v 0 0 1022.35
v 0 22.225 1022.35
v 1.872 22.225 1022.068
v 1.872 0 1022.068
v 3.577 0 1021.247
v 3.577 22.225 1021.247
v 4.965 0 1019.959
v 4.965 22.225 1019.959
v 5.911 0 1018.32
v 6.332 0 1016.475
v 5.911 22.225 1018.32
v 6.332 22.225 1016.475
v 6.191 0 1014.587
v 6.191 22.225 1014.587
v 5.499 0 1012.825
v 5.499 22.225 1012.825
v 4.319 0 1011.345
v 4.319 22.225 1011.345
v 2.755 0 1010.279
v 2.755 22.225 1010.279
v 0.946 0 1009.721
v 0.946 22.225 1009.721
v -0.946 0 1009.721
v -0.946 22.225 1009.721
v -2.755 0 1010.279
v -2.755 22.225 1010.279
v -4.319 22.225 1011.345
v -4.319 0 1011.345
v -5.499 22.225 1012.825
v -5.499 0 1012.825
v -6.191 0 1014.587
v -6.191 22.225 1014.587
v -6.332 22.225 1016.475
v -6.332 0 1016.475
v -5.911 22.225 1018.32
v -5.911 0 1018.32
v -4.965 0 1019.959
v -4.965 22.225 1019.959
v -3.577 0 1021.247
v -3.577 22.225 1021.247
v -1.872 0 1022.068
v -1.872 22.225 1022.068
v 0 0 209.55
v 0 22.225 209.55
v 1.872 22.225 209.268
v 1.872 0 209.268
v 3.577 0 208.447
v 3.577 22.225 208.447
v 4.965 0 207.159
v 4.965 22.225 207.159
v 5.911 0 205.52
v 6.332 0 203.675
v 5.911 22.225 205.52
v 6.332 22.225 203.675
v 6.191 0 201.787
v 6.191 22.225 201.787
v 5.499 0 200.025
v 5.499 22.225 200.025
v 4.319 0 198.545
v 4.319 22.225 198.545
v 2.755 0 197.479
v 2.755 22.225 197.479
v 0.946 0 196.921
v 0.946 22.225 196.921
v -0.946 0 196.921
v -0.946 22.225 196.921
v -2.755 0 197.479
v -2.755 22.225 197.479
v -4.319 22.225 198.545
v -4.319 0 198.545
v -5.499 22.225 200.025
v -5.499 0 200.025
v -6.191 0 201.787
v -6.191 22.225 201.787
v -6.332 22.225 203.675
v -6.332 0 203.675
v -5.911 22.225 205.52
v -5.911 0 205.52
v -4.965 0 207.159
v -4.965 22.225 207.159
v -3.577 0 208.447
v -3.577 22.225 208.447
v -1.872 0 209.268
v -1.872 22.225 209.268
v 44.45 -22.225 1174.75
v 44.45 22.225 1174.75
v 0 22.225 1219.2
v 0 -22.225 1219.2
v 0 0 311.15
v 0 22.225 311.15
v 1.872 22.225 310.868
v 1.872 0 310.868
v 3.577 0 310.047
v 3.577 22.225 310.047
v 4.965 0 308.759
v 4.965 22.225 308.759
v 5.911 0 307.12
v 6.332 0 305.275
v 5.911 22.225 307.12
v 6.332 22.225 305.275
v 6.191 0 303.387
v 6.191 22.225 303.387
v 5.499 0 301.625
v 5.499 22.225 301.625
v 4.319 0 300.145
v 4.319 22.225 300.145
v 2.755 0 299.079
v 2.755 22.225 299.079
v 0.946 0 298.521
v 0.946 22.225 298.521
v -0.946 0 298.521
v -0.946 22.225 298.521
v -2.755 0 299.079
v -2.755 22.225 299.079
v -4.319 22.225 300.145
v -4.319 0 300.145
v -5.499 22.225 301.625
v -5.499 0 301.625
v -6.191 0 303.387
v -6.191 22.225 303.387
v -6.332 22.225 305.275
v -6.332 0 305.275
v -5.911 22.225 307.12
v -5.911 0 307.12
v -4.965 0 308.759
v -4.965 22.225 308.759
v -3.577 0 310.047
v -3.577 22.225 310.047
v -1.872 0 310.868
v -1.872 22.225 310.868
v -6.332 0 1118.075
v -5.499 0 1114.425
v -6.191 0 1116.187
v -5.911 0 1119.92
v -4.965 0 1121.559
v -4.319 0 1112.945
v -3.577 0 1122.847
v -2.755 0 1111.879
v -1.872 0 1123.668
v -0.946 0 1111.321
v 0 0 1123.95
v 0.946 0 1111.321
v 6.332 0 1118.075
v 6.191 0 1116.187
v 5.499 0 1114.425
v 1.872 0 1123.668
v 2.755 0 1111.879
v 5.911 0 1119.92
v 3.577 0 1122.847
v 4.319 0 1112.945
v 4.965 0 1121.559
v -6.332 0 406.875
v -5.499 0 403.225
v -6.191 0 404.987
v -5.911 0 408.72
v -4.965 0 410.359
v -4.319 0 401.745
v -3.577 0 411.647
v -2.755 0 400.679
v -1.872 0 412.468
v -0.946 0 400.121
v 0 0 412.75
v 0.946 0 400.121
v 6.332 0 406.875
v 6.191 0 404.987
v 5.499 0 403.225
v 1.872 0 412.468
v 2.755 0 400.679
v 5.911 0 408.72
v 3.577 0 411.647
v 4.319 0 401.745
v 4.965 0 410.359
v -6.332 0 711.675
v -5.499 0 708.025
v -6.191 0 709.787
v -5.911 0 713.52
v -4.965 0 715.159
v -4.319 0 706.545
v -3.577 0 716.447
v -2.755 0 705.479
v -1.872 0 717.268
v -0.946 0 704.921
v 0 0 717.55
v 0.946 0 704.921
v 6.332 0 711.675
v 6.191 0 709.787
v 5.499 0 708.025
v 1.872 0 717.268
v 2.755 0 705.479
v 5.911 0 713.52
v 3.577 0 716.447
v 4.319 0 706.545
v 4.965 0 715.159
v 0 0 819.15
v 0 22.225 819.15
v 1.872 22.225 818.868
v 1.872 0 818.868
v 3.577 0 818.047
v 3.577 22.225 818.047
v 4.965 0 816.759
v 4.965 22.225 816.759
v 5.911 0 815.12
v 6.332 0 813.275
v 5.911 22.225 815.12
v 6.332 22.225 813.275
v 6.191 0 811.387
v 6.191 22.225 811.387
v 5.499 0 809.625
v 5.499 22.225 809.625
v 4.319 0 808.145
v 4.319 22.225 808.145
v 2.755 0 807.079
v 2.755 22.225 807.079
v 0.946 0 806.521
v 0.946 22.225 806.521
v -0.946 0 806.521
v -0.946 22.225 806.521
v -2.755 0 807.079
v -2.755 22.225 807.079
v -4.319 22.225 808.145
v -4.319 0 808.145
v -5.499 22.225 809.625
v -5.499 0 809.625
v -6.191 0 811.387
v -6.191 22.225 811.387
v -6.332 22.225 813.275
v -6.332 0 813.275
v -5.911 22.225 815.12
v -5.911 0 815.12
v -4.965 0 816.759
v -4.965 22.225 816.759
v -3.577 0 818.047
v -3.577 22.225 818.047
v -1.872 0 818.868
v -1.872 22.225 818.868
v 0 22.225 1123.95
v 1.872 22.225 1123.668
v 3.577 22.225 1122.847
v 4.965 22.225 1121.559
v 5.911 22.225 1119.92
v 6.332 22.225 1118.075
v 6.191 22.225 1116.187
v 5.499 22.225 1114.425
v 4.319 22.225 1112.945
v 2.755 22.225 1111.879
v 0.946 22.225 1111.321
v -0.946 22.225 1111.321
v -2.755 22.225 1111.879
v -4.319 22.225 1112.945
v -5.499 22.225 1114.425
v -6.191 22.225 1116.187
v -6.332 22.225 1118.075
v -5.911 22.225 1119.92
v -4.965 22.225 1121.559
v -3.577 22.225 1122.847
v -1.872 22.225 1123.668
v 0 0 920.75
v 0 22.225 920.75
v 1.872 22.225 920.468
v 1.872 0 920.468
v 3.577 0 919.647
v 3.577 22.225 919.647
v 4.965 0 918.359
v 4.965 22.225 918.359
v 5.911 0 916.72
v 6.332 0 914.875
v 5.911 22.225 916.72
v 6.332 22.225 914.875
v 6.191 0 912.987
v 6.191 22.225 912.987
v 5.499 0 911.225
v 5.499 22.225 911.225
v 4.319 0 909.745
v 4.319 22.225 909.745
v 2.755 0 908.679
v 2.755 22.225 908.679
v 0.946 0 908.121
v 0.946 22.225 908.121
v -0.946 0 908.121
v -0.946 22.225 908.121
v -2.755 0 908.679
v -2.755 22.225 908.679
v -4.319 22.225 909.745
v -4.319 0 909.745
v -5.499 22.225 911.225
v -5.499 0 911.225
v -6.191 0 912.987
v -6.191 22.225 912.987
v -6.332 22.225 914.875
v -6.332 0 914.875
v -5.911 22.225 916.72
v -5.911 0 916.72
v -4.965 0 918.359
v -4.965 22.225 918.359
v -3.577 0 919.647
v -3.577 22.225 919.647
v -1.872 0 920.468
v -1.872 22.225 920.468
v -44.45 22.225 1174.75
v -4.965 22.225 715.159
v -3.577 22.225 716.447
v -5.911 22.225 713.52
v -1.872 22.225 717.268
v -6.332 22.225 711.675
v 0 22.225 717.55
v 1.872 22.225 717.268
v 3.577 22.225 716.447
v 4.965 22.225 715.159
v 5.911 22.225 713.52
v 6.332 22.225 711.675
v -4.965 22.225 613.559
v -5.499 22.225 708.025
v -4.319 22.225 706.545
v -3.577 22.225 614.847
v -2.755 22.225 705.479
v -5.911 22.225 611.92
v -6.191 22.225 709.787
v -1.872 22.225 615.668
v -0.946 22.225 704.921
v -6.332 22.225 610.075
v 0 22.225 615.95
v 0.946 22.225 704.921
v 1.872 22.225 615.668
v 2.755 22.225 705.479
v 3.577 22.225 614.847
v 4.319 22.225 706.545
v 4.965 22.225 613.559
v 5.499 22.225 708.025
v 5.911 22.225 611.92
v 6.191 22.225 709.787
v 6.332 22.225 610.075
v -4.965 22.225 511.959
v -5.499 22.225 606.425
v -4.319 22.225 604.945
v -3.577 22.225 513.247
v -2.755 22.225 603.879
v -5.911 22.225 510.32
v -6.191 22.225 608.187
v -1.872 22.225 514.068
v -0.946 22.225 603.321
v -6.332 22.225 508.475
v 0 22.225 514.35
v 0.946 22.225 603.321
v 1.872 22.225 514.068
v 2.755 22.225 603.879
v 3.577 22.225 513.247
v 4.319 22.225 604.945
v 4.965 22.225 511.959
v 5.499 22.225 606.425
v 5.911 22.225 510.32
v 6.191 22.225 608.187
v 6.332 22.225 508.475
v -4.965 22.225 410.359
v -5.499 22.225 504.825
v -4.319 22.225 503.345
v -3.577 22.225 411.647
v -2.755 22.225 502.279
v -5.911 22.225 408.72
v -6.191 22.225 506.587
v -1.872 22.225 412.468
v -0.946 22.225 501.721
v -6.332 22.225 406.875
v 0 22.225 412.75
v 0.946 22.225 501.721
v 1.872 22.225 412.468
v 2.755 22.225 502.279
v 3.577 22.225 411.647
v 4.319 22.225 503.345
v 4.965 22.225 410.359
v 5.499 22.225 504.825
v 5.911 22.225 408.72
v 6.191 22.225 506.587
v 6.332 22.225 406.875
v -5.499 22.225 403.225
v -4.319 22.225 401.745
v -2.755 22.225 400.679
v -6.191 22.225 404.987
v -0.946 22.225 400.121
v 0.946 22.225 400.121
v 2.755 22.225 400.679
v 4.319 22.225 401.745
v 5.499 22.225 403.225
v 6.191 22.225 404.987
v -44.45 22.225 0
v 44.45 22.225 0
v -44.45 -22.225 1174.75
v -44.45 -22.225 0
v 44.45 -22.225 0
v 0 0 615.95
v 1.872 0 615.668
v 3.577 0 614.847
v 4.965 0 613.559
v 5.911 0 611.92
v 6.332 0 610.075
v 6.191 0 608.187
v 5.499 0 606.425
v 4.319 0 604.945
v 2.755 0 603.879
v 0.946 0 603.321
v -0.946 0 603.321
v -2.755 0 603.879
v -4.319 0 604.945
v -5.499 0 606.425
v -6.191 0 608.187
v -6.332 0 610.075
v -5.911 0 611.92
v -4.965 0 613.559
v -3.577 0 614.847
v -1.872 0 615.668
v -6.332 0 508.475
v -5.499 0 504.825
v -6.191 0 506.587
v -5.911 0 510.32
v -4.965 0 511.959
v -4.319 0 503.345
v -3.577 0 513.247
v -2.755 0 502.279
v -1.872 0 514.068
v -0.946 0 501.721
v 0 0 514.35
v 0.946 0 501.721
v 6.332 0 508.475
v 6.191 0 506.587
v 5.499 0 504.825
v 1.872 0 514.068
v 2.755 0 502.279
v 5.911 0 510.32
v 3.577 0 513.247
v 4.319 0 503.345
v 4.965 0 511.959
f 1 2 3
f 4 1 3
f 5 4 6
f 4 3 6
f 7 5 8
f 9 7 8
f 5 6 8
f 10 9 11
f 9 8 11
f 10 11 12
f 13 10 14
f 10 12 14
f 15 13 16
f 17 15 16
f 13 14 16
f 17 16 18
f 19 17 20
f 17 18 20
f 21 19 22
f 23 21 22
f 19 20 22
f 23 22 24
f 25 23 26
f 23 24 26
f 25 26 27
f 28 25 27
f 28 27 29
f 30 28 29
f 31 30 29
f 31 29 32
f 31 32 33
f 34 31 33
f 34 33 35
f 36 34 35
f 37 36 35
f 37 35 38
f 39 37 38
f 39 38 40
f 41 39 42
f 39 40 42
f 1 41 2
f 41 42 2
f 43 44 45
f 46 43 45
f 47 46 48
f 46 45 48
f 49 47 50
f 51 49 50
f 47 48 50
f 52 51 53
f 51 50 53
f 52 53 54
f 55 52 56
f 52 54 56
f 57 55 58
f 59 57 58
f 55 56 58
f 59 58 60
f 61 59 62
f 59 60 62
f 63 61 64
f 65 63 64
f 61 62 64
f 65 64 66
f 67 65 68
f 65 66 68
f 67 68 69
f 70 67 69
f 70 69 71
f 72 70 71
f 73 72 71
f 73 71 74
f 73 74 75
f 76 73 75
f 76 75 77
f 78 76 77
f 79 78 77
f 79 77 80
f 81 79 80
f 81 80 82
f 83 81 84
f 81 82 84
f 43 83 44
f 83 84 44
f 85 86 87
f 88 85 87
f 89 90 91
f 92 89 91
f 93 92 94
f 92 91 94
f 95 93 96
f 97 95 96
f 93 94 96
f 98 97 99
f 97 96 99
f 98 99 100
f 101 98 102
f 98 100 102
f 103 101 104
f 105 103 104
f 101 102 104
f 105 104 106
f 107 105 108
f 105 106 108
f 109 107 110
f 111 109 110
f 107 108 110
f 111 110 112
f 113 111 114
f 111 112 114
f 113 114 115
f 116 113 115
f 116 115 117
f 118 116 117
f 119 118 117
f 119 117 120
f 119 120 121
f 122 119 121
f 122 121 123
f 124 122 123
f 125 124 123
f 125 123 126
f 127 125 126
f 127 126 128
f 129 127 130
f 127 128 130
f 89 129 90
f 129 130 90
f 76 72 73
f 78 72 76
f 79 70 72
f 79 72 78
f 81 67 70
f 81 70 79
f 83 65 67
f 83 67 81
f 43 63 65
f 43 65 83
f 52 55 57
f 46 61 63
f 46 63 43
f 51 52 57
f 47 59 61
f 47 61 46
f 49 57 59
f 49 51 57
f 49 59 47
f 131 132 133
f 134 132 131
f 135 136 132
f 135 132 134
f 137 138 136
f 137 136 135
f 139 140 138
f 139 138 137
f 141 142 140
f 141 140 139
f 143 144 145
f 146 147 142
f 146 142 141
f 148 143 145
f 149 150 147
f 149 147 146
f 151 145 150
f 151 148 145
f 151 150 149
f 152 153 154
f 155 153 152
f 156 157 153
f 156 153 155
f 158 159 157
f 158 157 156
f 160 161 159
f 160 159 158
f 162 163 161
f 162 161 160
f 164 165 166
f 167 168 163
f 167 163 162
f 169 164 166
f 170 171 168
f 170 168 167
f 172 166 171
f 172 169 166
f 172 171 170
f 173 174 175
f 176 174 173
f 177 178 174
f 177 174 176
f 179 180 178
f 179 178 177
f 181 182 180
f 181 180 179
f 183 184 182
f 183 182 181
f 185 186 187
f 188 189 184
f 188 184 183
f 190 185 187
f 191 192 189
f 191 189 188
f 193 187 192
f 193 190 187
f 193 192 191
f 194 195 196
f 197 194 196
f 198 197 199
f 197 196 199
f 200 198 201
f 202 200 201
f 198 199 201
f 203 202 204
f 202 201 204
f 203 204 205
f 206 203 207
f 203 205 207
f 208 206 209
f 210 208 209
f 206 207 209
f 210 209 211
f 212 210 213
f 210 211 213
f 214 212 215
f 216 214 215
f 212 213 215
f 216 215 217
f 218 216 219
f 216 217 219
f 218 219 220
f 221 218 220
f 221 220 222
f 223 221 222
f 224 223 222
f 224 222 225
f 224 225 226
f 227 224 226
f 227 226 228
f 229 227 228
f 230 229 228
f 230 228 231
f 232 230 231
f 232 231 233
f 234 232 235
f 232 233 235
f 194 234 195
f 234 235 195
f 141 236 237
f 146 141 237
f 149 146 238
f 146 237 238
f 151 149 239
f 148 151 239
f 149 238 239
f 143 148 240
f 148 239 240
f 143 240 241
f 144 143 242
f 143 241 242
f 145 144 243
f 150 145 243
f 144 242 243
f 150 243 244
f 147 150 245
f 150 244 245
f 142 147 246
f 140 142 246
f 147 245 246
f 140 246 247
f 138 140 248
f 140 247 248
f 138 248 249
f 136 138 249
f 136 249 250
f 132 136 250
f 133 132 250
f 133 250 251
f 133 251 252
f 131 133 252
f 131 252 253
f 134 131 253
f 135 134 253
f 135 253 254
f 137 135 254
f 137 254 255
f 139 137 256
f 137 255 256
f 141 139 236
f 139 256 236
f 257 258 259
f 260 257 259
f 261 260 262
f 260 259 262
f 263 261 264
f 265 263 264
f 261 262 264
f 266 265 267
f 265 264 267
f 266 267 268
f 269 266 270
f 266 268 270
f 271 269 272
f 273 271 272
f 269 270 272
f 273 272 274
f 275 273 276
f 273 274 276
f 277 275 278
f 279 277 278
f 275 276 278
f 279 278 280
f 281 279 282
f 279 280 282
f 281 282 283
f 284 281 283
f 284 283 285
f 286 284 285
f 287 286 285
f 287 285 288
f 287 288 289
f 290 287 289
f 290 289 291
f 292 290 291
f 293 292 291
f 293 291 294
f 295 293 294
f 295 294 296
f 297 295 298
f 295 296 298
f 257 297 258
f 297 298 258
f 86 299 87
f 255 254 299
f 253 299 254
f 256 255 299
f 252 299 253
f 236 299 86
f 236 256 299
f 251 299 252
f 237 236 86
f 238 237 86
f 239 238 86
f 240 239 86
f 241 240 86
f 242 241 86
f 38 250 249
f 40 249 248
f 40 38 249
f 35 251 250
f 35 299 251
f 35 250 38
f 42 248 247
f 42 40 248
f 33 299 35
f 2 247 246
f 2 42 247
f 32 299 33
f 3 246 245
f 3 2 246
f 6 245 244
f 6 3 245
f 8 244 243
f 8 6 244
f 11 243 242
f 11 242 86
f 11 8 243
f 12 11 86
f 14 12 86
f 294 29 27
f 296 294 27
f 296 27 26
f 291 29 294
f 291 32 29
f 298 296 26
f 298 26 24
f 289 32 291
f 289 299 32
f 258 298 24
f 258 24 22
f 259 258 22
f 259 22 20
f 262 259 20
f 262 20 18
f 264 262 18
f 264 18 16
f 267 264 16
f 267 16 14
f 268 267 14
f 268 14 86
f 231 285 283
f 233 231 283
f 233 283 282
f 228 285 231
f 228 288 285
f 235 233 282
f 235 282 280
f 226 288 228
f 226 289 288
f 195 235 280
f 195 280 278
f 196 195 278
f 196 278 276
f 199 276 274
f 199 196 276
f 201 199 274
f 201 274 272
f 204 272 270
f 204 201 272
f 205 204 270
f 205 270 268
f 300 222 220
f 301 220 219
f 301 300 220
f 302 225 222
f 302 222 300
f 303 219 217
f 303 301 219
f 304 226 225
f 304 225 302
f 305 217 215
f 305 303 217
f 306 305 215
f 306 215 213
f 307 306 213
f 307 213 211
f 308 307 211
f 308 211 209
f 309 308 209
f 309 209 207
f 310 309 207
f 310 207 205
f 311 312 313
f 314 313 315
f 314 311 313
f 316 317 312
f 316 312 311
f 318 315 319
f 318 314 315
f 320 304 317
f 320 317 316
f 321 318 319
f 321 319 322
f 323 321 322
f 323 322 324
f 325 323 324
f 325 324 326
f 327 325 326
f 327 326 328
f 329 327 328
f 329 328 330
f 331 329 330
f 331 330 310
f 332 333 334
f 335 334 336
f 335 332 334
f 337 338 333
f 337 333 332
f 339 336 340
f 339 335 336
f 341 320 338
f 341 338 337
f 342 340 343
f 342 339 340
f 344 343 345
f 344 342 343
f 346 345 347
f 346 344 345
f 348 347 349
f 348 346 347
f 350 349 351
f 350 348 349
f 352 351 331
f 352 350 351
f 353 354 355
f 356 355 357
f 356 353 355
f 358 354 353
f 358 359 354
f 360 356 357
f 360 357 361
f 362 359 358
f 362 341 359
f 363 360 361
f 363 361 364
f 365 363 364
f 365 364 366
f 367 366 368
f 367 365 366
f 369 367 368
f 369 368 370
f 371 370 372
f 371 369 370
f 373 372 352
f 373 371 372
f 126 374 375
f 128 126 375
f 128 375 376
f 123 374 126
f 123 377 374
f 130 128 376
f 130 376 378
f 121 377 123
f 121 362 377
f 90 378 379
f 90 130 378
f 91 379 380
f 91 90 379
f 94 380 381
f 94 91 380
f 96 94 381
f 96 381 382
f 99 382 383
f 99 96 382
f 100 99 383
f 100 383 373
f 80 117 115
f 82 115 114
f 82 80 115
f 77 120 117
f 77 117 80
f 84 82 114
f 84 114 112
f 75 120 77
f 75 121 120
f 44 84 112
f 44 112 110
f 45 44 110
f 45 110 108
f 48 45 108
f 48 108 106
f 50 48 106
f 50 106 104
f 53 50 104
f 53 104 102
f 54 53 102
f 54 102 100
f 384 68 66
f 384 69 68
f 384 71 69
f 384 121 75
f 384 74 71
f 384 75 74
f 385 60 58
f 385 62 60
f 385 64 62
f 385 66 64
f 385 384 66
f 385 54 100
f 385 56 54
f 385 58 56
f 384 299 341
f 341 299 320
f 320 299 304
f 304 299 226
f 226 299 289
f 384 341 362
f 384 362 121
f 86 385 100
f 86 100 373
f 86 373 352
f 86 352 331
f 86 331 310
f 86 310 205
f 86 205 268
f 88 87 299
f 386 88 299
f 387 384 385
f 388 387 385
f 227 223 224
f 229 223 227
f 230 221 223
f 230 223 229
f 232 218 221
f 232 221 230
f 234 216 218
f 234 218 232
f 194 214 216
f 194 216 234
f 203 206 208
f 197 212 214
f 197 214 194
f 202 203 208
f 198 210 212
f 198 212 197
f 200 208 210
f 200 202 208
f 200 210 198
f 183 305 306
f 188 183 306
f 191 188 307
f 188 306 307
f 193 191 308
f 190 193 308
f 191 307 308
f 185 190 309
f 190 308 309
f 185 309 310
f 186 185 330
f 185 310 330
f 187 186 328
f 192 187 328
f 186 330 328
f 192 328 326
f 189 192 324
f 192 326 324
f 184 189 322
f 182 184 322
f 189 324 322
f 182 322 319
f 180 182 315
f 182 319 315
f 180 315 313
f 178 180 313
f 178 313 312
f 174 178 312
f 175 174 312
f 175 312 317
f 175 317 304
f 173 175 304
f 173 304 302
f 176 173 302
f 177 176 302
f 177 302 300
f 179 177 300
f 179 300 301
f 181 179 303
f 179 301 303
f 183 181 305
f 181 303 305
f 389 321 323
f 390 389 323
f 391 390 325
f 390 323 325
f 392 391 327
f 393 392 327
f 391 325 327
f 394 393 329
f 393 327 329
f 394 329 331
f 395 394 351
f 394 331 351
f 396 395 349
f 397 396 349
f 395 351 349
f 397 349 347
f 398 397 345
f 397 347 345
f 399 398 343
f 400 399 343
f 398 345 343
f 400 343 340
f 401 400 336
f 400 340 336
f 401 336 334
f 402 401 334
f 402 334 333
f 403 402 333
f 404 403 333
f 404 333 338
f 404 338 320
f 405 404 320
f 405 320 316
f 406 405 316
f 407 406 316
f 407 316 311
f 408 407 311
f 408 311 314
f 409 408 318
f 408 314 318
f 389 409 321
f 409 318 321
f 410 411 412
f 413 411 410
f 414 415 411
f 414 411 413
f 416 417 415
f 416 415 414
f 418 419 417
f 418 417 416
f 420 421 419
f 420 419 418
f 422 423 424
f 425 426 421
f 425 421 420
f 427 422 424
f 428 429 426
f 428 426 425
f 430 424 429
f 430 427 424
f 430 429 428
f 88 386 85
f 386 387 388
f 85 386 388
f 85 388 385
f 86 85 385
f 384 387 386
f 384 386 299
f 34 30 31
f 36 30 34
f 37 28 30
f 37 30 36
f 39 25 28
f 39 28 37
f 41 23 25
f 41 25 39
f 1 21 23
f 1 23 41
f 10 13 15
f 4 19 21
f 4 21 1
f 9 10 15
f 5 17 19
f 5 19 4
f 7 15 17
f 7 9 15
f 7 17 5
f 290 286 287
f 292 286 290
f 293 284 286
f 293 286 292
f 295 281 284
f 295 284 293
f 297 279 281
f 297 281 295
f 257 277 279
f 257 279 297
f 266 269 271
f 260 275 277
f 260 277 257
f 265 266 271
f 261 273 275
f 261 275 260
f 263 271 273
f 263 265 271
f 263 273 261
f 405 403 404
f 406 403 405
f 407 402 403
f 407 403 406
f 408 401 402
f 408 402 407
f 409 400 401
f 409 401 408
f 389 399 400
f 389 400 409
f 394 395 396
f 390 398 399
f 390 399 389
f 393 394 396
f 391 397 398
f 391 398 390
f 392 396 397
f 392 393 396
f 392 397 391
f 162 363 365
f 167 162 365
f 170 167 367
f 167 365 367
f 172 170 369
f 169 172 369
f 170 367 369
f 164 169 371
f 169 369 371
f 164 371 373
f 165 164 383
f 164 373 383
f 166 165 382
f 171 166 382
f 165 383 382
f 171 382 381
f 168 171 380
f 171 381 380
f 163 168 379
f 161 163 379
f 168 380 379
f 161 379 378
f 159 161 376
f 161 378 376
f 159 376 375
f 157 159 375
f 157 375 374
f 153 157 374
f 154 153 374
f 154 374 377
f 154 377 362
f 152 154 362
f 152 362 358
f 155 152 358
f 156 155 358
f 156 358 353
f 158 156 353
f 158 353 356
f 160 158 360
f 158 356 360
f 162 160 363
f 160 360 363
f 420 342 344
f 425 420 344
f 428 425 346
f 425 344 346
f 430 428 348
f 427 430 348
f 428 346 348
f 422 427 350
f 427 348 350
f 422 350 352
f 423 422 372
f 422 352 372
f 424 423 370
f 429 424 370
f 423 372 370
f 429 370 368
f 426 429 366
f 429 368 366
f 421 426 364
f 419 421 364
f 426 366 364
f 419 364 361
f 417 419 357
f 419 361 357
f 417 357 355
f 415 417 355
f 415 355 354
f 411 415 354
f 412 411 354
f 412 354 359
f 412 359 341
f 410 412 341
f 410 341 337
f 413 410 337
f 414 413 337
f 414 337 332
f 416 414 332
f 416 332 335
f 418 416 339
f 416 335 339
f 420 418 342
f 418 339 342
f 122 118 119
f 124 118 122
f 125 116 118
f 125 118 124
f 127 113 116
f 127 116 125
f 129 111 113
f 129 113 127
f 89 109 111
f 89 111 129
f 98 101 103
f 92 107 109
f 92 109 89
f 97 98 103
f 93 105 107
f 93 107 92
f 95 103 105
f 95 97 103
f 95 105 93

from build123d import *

# Parameters (mm, degrees)
SKETCH1_W           = 88.9
SKETCH1_H           = 44.45
BOSS_EXTRUDE1_DEPTH = 1219.2
CUT_EXTRUDE1_DEPTH  = 1221.819497305
SKETCH3_R           = 6.35
CUT_EXTRUDE2_DEPTH  = 22.225
LPATTERN1_COUNT     = 10
LPATTERN1_PITCH     = 101.6


with BuildPart() as part:
    # Sketch1 → Boss-Extrude1 (new body)
    with BuildSketch(Plane.XY):
        Rectangle(SKETCH1_W, SKETCH1_H)
    extrude(amount=BOSS_EXTRUDE1_DEPTH)

    # Sketch2 → Cut-Extrude1 (cut, through all)
    with BuildSketch(Plane(origin=(0, 22.225, 0), x_dir=(1, 0, 0), z_dir=(0, 1, 0))):
        Polygon((-44.45, -1219.2), (0, -1219.2), (-44.45, -1174.75), align=None)
        Polygon((44.45, -1174.75), (0, -1219.2), (44.45, -1219.2), align=None)
    extrude(amount=-CUT_EXTRUDE1_DEPTH, mode=Mode.SUBTRACT)

    # Sketch3 → Cut-Extrude2 (cut)
    with BuildSketch(Plane(origin=(0, 22.225, 0), x_dir=(1, 0, 0), z_dir=(0, 1, 0))):
        with Locations(Location((0, -1117.6, 0), (0, 0, 270))):
            Circle(SKETCH3_R)
    cut_extrude2 = extrude(amount=-CUT_EXTRUDE2_DEPTH, mode=Mode.SUBTRACT)

    # LPattern1: Cut-Extrude2 ×10
    with Locations(*[(0, 0, -i * LPATTERN1_PITCH) for i in range(1, LPATTERN1_COUNT)]):
        add(cut_extrude2, mode=Mode.SUBTRACT)


solid = part.part
